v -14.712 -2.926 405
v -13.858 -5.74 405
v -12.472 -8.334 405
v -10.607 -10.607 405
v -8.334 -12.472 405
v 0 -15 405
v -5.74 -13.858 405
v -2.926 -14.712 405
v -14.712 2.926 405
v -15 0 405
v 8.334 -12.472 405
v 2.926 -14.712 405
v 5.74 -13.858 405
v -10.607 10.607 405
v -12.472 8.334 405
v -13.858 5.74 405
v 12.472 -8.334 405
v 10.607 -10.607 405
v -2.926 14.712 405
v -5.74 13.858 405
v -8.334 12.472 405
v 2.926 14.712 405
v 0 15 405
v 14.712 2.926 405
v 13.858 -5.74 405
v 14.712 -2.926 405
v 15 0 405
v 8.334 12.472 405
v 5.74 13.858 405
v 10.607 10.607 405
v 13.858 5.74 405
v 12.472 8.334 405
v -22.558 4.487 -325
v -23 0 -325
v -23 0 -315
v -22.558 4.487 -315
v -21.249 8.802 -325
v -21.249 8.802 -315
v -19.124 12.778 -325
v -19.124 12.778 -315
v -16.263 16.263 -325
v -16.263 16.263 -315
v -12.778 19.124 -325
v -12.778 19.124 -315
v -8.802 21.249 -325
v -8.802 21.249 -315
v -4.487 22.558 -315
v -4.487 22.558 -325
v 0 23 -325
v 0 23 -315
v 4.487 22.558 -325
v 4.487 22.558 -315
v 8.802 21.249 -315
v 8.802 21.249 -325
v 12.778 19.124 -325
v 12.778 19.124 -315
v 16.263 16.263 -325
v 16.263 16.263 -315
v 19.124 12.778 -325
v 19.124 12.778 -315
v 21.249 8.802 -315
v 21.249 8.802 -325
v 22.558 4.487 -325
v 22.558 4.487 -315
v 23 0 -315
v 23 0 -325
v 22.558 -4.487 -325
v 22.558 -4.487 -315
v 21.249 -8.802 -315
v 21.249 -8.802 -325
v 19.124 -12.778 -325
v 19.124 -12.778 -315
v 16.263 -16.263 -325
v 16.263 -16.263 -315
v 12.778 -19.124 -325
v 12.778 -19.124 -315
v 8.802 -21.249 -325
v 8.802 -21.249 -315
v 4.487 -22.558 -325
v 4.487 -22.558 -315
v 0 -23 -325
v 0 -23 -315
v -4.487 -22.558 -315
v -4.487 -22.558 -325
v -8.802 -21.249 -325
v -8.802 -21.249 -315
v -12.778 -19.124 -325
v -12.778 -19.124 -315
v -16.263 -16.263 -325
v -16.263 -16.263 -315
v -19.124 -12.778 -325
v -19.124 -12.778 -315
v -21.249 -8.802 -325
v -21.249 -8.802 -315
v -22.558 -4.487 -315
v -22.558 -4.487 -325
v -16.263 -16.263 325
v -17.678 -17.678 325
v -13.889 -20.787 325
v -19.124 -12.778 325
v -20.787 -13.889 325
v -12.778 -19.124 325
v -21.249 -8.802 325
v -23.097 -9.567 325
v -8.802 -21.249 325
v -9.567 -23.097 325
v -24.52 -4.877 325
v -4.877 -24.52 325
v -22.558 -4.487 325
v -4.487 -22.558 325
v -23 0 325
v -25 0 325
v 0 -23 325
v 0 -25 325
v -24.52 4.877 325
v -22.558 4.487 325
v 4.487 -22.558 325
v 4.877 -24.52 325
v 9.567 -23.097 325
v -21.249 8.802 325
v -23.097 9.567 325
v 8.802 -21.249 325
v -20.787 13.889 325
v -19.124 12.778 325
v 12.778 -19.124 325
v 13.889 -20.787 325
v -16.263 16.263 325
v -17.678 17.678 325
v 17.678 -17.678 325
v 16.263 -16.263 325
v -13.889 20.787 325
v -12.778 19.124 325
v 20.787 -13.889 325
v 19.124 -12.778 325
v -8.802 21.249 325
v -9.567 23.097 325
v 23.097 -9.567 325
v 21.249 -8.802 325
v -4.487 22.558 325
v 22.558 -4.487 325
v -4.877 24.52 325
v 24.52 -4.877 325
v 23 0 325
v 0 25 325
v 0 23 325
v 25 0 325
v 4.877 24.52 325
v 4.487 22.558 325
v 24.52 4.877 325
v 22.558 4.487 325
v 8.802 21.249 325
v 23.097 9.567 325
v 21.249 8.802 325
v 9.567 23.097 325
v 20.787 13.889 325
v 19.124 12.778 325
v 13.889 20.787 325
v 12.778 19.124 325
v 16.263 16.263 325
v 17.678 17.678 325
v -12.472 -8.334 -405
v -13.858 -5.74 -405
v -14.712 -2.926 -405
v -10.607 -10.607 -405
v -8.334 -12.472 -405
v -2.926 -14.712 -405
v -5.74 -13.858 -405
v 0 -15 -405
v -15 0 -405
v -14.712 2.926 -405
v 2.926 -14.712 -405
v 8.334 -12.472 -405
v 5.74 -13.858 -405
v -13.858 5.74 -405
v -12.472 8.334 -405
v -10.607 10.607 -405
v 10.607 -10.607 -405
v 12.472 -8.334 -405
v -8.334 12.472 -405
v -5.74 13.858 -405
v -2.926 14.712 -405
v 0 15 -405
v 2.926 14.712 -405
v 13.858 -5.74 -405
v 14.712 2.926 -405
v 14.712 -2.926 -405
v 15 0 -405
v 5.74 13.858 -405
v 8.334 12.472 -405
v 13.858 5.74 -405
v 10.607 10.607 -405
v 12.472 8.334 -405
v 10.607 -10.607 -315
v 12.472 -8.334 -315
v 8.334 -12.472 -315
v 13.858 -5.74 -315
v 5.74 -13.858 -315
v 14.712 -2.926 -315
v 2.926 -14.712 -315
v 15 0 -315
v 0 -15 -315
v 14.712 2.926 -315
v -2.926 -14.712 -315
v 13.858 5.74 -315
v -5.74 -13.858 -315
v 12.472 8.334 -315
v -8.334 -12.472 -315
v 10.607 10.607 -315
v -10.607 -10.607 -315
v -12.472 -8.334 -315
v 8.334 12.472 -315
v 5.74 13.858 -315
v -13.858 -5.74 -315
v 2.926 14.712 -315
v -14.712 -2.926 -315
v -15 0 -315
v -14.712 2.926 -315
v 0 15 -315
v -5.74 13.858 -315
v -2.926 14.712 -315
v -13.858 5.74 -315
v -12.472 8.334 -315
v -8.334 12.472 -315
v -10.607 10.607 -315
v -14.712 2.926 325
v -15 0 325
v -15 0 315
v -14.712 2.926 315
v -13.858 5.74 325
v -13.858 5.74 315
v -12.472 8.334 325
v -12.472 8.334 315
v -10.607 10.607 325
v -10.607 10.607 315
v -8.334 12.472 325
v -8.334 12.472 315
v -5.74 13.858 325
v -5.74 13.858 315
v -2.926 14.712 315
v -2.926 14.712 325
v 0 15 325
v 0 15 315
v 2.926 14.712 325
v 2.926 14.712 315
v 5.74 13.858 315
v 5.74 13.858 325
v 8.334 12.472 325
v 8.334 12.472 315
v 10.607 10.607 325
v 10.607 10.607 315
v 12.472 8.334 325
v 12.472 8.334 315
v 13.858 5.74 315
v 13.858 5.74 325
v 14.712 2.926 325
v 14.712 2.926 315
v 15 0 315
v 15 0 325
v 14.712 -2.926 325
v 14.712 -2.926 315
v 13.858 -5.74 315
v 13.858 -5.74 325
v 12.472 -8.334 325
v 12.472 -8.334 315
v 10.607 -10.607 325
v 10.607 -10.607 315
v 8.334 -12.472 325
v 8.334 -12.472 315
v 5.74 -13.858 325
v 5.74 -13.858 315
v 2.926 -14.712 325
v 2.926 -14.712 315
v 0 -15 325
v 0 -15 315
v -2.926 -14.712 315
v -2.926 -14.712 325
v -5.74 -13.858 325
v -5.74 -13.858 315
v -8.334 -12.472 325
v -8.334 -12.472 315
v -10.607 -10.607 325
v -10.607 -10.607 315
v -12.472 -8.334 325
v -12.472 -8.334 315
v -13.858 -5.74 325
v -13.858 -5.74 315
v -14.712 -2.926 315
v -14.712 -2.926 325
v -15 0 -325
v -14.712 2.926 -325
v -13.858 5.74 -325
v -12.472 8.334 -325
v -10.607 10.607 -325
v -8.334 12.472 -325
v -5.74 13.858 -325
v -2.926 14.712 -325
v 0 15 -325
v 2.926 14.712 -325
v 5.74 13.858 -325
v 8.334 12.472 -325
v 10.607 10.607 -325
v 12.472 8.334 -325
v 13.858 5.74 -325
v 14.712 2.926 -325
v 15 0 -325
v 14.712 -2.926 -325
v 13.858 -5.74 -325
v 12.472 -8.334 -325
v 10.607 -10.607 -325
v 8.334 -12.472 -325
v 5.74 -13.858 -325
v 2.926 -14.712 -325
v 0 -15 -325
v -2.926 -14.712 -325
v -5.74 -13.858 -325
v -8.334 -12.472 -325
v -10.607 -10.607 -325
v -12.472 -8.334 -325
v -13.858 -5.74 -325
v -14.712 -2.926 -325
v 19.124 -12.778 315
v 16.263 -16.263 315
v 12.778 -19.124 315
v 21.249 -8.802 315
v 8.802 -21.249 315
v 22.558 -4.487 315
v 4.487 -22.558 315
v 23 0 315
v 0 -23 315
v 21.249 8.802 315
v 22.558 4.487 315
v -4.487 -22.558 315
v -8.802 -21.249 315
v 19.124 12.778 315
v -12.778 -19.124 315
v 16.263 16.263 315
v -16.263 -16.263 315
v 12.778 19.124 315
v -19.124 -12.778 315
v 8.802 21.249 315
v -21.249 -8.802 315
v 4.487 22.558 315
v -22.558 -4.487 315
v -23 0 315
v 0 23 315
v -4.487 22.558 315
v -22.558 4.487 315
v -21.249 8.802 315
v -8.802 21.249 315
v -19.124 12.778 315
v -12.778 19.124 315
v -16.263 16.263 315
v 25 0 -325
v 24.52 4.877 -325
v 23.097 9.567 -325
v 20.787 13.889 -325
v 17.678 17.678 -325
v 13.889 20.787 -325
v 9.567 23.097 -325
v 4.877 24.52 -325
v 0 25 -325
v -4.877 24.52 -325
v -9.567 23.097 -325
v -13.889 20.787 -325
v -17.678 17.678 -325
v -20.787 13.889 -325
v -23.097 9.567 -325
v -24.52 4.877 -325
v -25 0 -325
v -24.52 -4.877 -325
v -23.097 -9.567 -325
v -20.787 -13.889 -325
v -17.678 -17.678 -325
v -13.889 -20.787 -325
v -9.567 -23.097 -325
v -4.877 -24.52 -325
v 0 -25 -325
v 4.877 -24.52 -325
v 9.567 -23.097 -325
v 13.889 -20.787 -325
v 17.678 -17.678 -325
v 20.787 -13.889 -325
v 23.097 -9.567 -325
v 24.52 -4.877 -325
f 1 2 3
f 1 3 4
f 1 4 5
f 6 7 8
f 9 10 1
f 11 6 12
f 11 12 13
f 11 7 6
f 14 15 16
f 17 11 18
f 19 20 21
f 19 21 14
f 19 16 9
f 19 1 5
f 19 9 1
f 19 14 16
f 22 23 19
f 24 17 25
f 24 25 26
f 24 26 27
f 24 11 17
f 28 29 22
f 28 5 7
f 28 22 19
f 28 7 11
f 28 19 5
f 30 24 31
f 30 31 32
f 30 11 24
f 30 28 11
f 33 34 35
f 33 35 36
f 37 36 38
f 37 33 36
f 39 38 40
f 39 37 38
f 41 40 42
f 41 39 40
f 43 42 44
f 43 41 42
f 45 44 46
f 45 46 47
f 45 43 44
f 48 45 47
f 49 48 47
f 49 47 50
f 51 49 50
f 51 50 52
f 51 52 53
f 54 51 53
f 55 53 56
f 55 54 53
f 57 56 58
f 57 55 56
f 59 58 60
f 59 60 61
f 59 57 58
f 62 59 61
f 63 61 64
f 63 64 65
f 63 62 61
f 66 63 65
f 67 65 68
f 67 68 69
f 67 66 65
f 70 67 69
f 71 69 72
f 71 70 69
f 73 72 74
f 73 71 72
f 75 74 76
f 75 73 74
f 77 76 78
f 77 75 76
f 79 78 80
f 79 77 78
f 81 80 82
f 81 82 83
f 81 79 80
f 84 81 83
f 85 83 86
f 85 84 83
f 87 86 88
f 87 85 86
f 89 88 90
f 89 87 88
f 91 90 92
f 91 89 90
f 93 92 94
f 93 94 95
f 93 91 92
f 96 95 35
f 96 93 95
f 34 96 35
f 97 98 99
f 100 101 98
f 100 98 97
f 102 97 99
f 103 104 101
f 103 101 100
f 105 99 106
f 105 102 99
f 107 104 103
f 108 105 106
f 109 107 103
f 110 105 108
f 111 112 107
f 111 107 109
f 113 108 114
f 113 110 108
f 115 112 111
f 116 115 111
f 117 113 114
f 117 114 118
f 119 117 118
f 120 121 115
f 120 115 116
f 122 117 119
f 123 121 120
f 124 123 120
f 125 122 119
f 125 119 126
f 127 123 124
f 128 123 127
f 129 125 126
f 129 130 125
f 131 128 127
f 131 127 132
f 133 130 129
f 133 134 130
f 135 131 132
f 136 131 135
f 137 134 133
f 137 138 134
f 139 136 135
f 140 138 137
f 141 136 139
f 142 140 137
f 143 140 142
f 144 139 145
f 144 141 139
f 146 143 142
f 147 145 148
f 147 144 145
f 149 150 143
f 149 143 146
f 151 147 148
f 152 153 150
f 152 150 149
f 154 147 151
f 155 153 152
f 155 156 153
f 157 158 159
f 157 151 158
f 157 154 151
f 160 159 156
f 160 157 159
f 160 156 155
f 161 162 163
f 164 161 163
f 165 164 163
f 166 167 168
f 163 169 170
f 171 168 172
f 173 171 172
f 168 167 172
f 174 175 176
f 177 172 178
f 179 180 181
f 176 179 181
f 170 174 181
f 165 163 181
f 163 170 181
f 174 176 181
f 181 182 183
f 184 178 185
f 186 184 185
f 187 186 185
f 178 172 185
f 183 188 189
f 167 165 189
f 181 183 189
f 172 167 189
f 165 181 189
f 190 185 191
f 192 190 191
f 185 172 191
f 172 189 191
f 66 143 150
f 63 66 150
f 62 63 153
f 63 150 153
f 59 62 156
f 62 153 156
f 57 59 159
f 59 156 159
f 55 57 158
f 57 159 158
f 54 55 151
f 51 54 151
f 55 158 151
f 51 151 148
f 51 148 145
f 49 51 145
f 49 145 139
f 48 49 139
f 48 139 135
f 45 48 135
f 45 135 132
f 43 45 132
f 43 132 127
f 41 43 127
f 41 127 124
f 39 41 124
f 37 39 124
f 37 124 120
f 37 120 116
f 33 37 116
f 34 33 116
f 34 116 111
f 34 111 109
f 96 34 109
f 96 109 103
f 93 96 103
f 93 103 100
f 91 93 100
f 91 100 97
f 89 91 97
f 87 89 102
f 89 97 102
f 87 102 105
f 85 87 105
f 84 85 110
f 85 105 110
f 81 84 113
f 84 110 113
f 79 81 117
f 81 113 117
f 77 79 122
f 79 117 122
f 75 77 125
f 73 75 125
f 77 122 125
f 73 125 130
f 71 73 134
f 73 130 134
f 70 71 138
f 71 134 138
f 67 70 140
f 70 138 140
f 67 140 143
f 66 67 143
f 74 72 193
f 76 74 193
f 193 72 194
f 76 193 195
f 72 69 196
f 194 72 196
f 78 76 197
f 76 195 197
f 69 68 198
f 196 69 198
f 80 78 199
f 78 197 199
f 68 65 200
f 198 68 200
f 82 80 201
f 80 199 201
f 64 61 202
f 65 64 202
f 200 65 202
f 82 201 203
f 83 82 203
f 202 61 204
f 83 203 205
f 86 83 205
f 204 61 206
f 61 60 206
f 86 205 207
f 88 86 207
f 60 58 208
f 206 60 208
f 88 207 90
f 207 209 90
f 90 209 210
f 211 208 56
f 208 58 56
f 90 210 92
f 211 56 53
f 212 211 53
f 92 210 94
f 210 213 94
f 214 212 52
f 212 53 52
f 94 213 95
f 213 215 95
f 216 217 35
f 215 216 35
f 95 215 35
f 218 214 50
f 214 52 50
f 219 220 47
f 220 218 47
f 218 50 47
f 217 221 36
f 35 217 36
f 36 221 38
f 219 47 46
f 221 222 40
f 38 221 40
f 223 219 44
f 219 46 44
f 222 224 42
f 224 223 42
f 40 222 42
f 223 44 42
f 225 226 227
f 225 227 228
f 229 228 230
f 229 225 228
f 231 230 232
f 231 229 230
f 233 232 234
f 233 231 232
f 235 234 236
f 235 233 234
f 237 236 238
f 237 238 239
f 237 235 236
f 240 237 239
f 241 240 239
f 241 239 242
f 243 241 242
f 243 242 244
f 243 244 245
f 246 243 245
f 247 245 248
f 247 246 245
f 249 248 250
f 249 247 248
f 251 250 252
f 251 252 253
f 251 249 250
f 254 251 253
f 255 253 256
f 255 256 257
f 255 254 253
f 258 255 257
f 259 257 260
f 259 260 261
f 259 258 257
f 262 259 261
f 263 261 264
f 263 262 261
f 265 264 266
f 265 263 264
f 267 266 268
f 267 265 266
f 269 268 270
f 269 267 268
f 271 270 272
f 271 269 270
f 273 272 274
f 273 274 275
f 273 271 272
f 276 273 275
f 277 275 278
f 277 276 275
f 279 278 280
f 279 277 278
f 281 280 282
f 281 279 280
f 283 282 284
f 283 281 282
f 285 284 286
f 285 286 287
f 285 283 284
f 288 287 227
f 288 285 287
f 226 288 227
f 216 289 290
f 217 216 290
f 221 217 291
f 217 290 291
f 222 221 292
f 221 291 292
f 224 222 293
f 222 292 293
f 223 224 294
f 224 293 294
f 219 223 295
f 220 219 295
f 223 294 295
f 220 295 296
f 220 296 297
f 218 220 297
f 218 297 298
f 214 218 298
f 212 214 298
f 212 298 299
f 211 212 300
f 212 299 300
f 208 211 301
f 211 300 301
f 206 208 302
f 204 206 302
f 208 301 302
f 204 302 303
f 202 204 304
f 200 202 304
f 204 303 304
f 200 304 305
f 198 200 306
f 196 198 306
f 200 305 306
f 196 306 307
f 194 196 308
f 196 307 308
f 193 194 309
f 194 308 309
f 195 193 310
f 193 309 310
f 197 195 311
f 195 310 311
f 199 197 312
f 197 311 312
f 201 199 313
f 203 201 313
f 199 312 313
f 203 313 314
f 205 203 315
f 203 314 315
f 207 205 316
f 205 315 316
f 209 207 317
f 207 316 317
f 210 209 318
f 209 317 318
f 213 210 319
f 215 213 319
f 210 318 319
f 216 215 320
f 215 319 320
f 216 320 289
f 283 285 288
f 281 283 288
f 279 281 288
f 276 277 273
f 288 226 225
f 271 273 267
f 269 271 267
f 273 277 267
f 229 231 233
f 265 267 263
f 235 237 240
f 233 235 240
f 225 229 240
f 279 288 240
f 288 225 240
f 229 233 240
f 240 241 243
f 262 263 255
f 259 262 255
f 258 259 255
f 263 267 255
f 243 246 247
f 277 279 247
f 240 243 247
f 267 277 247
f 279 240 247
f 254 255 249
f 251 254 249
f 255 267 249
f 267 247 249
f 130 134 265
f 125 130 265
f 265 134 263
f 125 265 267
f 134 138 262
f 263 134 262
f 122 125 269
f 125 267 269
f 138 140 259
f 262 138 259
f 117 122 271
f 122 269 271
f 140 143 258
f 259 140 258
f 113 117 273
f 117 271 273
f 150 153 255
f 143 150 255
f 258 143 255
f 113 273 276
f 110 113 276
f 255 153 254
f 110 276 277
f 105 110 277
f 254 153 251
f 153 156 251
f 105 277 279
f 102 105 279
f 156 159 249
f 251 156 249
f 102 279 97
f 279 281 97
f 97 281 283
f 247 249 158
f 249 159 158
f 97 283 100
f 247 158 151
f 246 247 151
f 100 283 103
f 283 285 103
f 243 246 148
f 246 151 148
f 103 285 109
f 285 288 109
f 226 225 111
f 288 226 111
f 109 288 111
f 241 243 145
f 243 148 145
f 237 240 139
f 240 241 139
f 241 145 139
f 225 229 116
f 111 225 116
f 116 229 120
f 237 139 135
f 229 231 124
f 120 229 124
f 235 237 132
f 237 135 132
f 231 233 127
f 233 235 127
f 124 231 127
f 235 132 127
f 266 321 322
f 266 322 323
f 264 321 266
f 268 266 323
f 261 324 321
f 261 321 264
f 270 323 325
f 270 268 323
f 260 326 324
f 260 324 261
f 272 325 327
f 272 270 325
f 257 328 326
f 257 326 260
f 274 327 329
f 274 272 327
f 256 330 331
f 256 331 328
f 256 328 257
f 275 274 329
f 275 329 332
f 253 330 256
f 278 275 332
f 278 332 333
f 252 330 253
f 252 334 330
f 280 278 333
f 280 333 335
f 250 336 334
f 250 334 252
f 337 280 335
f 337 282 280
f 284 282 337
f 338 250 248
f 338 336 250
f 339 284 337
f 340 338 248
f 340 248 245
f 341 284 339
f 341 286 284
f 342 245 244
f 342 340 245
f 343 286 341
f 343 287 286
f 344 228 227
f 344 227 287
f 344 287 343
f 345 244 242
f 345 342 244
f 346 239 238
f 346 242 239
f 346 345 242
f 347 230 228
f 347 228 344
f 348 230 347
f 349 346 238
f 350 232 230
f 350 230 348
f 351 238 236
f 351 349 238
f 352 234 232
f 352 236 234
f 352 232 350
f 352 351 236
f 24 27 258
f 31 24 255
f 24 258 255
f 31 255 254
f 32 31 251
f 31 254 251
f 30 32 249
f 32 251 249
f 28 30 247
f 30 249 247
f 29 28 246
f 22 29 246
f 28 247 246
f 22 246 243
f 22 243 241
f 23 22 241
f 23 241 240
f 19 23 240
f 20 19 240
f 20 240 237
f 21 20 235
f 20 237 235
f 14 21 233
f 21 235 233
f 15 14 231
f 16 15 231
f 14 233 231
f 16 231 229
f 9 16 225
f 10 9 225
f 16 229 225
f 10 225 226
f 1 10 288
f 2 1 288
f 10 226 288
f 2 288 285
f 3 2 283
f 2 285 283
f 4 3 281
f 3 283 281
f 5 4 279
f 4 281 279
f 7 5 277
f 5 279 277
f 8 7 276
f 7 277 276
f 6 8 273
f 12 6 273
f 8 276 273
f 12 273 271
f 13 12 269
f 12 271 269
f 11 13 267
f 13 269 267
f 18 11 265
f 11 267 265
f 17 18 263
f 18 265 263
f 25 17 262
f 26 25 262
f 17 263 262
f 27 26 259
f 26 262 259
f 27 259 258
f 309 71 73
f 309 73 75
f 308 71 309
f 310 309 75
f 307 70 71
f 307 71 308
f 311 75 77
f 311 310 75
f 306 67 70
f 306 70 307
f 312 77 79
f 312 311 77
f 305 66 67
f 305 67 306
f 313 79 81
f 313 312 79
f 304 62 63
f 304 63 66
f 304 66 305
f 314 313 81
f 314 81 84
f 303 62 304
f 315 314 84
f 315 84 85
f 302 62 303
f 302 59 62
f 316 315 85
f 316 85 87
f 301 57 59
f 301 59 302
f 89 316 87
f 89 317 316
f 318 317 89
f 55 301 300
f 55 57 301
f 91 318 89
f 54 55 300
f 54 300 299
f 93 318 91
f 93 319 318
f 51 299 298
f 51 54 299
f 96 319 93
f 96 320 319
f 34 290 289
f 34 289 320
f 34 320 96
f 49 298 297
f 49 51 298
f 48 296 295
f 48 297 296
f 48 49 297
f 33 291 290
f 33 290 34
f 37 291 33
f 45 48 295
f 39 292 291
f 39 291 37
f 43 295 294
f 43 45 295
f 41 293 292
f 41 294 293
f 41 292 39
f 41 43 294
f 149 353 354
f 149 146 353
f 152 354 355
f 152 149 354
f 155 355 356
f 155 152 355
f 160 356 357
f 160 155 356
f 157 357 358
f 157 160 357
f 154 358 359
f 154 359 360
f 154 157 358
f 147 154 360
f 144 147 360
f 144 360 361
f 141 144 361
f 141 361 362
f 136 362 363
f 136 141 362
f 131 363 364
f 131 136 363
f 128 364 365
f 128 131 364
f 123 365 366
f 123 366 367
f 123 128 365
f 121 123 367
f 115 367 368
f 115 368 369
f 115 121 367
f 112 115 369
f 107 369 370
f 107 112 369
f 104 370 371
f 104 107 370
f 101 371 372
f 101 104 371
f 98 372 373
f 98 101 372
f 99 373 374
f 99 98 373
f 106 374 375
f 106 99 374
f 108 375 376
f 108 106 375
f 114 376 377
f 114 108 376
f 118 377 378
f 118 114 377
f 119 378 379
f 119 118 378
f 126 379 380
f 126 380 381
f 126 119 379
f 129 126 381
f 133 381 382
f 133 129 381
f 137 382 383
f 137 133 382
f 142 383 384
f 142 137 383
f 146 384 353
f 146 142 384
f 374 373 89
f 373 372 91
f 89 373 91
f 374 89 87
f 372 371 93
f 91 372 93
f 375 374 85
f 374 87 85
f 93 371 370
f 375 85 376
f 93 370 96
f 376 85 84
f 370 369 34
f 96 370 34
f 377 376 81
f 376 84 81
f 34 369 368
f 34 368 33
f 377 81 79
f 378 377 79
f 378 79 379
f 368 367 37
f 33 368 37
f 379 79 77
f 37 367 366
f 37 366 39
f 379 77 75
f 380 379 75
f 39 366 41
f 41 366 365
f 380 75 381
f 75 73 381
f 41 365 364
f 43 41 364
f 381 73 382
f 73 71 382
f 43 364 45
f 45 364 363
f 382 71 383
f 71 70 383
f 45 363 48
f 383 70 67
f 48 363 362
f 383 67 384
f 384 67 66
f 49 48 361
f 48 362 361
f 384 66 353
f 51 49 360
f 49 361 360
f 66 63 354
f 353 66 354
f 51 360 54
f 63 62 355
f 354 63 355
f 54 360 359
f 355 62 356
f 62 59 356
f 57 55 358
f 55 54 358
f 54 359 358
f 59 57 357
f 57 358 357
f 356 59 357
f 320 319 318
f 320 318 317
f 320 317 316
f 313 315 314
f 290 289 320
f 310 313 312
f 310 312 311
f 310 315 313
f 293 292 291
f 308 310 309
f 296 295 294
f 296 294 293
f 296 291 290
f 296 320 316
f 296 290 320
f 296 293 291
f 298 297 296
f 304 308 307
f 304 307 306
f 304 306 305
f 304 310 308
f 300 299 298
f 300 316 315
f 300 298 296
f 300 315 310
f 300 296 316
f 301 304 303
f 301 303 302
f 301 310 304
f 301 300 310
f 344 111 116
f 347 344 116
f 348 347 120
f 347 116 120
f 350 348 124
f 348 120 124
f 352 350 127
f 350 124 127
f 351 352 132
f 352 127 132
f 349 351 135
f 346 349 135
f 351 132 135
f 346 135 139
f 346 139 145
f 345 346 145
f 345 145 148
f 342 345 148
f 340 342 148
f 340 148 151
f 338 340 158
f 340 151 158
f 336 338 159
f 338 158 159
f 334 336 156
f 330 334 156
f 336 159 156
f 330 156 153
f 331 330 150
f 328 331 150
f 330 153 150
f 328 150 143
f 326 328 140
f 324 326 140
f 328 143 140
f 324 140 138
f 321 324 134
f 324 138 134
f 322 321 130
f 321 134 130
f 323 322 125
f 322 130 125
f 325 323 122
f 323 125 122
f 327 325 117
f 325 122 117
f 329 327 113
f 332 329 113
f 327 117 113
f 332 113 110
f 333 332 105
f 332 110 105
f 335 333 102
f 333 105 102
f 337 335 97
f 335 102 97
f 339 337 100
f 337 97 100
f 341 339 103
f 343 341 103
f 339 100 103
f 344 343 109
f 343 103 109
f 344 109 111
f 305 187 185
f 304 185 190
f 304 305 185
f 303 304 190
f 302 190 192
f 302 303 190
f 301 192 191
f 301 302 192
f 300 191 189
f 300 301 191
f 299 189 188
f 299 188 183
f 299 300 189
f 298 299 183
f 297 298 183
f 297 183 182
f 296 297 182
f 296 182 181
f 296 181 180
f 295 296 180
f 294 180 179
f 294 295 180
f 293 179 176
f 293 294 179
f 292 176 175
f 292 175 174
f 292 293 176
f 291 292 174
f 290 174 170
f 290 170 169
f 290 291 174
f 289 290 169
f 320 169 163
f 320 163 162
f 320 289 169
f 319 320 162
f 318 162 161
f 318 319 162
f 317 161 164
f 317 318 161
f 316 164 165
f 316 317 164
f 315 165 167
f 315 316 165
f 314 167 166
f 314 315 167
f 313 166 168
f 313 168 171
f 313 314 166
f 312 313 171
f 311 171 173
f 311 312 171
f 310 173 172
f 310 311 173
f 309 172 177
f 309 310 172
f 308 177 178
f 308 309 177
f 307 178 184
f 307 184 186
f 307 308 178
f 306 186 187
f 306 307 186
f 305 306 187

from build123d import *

# Parameters (mm, degrees)
SKETCH1_R           = 25
BOSS_EXTRUDE1_DEPTH = 325
SKETCH2_R           = 15
BOSS_EXTRUDE2_DEPTH = 80
SHELL1_T            = -2
SKETCH3_R           = 23
SKETCH3_R_2         = 15
BOSS_EXTRUDE3_DEPTH = 10


with BuildPart() as part:
    # Sketch1 → Boss-Extrude1 (new, symmetric)
    with BuildSketch(Plane.XY):
        Circle(SKETCH1_R)
    extrude(amount=BOSS_EXTRUDE1_DEPTH, both=True)

    # Shell1
    shell1_openings = [part.faces().sort_by_distance(p)[0] for p in [
        (0, 0, 325),
        (0, 0, -325),
    ]]
    offset(amount=SHELL1_T, openings=shell1_openings, kind=Kind.INTERSECTION)


with BuildPart() as body_2:
    # Sketch2 → Boss-Extrude2 (new body)
    with BuildSketch(Plane.XY.offset(325)):
        Circle(SKETCH2_R)
    extrude(amount=BOSS_EXTRUDE2_DEPTH)


with BuildPart() as body_3:
    # Mirror1: mirrored copy
    add(body_2.part.mirror(Plane.XY))


with BuildPart() as body_4:
    # Sketch3 → Boss-Extrude3 (new body)
    with BuildSketch(Plane(origin=(0, 0, -325), x_dir=(-1, 0, 0), z_dir=(0, 0, -1))):
        Circle(SKETCH3_R)
        Circle(SKETCH3_R_2, mode=Mode.SUBTRACT)
    extrude(amount=-BOSS_EXTRUDE3_DEPTH)


with BuildPart() as body_5:
    # Mirror2: mirrored copy
    add(body_4.part.mirror(Plane.XY))


solid = Compound([part.part, body_2.part, body_3.part, body_4.part, body_5.part])
